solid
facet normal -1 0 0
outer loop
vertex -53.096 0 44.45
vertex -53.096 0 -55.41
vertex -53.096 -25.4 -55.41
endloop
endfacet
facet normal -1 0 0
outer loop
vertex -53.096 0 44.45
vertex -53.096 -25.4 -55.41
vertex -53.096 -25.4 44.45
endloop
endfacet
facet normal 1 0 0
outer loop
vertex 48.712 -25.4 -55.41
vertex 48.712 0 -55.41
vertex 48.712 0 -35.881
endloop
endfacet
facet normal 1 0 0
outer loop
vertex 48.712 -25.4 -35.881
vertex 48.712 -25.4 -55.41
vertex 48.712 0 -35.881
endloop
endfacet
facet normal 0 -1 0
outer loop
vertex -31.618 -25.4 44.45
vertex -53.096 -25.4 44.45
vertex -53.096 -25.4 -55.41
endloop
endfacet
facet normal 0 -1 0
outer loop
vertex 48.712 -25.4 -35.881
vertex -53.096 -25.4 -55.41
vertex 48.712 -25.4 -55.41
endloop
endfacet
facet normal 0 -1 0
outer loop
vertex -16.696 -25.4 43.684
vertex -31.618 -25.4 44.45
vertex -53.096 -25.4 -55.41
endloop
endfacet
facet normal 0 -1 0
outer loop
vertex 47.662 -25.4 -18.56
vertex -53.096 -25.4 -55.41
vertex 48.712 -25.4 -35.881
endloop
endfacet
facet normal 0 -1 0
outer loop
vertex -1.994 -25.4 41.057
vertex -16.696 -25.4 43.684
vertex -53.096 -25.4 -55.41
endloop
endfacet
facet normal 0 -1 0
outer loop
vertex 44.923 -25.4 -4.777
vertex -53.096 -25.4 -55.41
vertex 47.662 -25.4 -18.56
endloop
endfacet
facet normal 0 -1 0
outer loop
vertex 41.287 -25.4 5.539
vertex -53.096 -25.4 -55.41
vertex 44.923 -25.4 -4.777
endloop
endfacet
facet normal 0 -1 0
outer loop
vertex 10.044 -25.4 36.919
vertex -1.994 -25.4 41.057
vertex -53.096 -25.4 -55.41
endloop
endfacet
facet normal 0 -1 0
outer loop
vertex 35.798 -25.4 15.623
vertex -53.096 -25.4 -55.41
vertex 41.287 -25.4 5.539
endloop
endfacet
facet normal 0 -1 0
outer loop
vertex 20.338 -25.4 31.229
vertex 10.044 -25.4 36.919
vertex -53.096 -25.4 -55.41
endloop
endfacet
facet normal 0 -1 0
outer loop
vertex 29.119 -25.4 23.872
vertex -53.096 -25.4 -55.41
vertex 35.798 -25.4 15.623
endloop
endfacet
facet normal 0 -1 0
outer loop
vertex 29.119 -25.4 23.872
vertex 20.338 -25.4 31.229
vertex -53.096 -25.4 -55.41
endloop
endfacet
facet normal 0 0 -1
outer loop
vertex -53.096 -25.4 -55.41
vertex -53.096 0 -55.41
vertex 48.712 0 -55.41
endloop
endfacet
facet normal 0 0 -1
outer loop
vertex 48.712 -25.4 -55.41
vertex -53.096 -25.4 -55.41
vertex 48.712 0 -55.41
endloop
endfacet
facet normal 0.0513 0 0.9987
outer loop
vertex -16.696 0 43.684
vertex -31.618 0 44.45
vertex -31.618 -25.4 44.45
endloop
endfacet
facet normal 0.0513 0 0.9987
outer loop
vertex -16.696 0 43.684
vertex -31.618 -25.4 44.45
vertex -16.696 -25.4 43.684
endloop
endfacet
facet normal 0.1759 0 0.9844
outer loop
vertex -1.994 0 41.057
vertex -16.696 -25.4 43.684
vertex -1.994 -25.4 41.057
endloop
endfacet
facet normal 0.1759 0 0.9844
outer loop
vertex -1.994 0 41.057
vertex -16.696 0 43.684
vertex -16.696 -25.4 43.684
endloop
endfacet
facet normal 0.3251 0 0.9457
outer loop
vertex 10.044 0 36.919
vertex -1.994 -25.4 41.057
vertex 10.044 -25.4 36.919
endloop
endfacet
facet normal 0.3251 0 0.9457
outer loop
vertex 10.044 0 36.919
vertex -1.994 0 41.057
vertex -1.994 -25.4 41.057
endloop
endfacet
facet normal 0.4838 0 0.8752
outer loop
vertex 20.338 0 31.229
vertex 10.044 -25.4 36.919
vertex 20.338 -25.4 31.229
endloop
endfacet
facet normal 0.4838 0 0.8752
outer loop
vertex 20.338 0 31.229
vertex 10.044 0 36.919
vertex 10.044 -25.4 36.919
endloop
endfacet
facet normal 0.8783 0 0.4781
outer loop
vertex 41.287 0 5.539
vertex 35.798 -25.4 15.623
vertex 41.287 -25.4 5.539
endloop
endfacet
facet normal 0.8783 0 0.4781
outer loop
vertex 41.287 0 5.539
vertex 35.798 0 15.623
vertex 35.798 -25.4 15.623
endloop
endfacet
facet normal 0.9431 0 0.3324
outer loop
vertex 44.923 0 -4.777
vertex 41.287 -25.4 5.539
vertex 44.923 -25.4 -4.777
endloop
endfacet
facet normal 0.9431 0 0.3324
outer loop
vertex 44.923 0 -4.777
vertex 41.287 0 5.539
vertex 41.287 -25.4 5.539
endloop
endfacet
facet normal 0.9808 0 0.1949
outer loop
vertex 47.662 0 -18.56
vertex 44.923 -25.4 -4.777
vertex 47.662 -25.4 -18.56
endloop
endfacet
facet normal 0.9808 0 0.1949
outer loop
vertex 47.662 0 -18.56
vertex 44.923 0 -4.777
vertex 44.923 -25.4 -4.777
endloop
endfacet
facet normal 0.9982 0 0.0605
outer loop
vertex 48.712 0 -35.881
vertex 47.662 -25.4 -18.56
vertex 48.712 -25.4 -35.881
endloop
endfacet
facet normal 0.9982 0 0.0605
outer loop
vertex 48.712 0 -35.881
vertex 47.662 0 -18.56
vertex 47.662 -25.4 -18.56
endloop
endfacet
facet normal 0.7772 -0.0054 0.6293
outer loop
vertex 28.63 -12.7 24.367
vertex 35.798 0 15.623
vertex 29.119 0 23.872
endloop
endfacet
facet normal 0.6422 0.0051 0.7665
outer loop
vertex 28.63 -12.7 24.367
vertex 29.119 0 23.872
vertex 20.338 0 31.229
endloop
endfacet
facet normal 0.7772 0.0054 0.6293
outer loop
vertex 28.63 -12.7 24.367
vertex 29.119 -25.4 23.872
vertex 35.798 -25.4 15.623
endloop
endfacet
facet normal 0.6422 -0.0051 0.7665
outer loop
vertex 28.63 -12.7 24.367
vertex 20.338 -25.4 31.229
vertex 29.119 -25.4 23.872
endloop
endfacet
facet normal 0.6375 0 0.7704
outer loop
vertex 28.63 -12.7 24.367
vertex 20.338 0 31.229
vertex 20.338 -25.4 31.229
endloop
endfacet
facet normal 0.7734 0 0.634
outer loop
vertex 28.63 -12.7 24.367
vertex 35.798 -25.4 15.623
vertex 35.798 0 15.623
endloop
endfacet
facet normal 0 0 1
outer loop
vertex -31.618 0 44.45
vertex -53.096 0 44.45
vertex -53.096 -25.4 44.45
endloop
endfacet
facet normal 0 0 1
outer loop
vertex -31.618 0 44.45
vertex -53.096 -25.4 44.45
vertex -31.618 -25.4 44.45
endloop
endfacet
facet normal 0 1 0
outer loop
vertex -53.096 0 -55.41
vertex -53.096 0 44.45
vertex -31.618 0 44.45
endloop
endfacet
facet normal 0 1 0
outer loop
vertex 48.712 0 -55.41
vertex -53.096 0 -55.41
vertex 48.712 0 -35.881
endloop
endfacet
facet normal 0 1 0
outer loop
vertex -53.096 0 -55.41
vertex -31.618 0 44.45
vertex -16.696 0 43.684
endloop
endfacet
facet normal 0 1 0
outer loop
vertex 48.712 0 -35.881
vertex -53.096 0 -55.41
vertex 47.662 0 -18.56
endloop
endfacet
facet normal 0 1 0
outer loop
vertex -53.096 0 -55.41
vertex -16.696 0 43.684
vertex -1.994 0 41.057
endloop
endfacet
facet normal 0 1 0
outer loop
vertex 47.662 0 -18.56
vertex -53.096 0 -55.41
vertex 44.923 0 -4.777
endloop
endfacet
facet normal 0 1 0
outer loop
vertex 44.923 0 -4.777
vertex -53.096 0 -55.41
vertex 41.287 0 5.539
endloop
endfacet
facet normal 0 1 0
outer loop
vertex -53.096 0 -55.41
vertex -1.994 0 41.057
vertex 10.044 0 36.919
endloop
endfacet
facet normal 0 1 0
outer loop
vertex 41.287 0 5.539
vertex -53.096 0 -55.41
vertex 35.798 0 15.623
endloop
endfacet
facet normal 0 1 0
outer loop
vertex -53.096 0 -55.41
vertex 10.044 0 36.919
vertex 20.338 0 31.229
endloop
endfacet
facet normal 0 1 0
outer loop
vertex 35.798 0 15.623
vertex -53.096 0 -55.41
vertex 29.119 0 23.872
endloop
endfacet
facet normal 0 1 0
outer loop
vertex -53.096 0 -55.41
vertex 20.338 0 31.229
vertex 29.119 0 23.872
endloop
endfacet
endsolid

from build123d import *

# Parameters (mm, degrees)
F0_W        = 101.8087677658
F0_H        = 99.8602770269
F1_DEPTH    = 25.4
F2_T1_DEPTH = 427.052710372


# Not quite as in the source:
# - a fillet or chamfer that OpenCascade refuses, or shapes differently, is made with other operations: its cross-section is extruded or revolved along the edge and cut away or added


with BuildPart() as f1:
    # F0 (on Front) → F1 (new body)
    with BuildSketch(Plane.XZ):
        with Locations((-2.1920558065, -5.4801348597)):
            Rectangle(F0_W, F0_H)
    extrude(amount=F1_DEPTH)

    # F2: fillet of radius 80.3305420744 on 1 edges, made by hand

    # F2_s2 → F2_t1 (cut)
    with BuildSketch(Plane.XZ.offset(-200.826355186)):
        with BuildLine():
            add(Edge.make_bspline(
                [(-31.618213998, 44.4500036538), (48.7123280764, 44.4500036538), (48.7123280764, -35.8805384206)],
                knots=[0, 0, 0, 1, 1, 1], degree=2, weights=[1, 1, 1]))
            Line((48.7123280764, -35.8805384206), (48.7123280764, 44.4500036538))
            Line((48.7123280764, 44.4500036538), (-31.618213998, 44.4500036538))
        make_face()
    extrude(amount=F2_T1_DEPTH, mode=Mode.SUBTRACT)


solid = f1.part
